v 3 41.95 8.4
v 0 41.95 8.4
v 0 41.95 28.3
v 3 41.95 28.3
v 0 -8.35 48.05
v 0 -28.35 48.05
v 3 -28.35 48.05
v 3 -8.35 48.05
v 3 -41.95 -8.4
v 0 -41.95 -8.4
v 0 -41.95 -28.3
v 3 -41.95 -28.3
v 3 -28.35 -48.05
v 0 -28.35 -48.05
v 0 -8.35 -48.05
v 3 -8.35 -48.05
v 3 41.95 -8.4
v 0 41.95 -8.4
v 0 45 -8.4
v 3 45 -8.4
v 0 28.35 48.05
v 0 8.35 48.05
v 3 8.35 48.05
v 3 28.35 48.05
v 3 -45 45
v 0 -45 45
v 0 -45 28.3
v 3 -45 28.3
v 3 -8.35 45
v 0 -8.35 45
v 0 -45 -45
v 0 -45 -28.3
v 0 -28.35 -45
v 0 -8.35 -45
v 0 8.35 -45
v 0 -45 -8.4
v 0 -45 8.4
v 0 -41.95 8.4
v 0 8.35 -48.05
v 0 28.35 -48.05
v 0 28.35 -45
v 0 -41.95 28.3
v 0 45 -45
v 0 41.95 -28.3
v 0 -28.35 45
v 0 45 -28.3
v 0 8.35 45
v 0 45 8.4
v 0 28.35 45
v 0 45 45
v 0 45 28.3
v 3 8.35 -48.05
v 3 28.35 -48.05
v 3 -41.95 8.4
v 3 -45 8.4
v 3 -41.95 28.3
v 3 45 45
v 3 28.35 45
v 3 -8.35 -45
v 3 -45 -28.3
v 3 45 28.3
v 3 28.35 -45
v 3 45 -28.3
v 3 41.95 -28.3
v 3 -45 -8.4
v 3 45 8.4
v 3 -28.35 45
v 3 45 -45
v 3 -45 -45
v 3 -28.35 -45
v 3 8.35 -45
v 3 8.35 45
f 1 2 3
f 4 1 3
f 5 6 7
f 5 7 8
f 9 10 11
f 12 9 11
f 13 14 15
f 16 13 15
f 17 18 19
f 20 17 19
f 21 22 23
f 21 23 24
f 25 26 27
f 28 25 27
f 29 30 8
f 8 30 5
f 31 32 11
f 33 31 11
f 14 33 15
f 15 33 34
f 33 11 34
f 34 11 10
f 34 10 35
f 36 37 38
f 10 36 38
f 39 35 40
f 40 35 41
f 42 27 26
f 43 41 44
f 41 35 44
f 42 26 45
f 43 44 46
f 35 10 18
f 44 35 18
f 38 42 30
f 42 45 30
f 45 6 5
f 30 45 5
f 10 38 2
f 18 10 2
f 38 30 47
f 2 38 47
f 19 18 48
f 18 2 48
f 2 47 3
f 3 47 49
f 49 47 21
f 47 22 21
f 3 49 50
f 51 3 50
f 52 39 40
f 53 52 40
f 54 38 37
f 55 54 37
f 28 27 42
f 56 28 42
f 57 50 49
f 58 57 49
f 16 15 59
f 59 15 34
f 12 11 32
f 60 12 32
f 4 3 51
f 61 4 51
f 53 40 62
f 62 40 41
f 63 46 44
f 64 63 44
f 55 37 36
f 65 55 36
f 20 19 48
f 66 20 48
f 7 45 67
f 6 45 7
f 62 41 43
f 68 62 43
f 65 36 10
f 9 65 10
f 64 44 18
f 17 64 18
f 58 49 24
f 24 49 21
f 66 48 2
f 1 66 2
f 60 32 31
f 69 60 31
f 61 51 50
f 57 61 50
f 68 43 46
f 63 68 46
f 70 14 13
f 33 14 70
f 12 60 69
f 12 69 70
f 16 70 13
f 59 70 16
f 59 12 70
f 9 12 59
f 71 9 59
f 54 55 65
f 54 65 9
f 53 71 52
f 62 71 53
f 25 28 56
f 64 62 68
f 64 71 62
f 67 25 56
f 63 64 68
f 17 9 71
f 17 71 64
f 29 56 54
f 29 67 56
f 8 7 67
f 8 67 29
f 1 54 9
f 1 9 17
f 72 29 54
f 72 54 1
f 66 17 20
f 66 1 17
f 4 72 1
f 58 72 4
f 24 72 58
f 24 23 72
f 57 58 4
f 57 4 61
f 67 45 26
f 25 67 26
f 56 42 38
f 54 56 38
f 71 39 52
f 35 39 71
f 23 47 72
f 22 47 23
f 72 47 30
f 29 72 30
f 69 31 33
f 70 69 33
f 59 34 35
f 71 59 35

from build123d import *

# Parameters (mm, degrees)
F0_W     = 20
F0_H     = 3.05
F1_DEPTH = 3


# Not quite as in the source:
# - a feature names something its author has since deleted; it is built from what else it names


with BuildPart() as f1:
    # F0 (on Right) → F1 (new body)
    with BuildSketch(Plane.YZ):
        Polygon((28.35, -45), (45, -45), (45, -28.3), (41.95, -28.3), (41.95, -8.4), (45, -8.4), (45, 8.4), (41.95, 8.4), (41.95, 28.3), (45, 28.3), (45, 45), (28.35, 45), (8.35, 45), (-8.35, 45), (-28.35, 45), (-45, 45), (-45, 28.3), (-41.95, 28.3), (-41.95, 8.4), (-45, 8.4), (-45, -8.4), (-41.95, -8.4), (-41.95, -28.3), (-45, -28.3), (-45, -45), (-28.35, -45), (-8.35, -45), (8.35, -45), align=None)
        with Locations((-18.35, -46.525)):
            Rectangle(F0_W, F0_H)
        with Locations((18.35, -46.525)):
            Rectangle(F0_W, F0_H)
        with Locations((18.35, 46.525)):
            Rectangle(F0_W, F0_H)
        with Locations((-18.35, 46.525)):
            Rectangle(F0_W, F0_H)
    extrude(amount=F1_DEPTH)


solid = f1.part
